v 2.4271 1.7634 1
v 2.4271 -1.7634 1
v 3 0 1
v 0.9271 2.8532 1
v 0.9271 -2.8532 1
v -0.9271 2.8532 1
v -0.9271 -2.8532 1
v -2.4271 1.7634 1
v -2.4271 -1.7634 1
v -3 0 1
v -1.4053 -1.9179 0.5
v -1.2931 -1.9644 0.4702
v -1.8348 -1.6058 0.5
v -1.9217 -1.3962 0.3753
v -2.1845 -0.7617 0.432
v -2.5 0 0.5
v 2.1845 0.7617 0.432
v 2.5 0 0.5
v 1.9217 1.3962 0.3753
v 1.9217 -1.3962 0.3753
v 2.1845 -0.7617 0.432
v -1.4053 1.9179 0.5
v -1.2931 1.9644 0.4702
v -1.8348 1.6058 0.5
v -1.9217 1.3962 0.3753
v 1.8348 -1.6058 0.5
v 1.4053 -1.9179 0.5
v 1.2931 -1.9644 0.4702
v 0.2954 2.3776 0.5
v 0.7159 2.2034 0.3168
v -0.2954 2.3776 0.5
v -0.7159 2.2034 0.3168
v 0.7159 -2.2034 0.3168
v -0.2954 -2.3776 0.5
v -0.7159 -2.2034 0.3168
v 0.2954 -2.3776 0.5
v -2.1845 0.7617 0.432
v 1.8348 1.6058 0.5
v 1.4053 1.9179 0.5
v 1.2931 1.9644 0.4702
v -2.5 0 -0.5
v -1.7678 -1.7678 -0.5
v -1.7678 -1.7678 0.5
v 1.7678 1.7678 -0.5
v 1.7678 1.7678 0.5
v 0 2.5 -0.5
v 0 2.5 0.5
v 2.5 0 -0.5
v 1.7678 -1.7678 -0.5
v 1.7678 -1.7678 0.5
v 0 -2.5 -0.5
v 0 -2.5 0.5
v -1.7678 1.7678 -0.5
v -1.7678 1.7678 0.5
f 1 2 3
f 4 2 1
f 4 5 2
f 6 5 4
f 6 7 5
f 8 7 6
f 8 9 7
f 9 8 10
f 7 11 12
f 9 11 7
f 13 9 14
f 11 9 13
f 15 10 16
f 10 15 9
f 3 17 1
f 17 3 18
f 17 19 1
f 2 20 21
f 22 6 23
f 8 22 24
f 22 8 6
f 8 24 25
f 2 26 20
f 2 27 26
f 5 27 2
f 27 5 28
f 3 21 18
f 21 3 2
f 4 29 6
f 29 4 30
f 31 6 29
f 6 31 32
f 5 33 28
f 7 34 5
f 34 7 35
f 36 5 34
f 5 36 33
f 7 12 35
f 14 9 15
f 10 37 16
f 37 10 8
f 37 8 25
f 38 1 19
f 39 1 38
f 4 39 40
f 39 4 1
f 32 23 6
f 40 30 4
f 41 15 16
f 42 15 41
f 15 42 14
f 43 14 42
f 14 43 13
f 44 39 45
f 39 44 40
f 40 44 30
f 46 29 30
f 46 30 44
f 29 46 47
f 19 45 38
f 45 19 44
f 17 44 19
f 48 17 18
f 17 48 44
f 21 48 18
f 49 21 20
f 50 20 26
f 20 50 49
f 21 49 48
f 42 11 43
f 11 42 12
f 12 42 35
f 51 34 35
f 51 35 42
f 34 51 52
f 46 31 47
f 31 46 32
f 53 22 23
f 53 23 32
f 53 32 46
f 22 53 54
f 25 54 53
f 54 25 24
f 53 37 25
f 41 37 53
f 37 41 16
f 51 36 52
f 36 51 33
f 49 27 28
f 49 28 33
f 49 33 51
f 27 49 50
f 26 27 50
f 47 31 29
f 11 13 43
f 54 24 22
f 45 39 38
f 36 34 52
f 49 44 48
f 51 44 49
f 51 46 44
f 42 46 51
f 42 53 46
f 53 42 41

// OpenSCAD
cylinder();
cylinder(1, 2, 3);
cylinder(1, r1 = 2, d2 = 6);
cylinder(1, r = 2.5, center = true);
